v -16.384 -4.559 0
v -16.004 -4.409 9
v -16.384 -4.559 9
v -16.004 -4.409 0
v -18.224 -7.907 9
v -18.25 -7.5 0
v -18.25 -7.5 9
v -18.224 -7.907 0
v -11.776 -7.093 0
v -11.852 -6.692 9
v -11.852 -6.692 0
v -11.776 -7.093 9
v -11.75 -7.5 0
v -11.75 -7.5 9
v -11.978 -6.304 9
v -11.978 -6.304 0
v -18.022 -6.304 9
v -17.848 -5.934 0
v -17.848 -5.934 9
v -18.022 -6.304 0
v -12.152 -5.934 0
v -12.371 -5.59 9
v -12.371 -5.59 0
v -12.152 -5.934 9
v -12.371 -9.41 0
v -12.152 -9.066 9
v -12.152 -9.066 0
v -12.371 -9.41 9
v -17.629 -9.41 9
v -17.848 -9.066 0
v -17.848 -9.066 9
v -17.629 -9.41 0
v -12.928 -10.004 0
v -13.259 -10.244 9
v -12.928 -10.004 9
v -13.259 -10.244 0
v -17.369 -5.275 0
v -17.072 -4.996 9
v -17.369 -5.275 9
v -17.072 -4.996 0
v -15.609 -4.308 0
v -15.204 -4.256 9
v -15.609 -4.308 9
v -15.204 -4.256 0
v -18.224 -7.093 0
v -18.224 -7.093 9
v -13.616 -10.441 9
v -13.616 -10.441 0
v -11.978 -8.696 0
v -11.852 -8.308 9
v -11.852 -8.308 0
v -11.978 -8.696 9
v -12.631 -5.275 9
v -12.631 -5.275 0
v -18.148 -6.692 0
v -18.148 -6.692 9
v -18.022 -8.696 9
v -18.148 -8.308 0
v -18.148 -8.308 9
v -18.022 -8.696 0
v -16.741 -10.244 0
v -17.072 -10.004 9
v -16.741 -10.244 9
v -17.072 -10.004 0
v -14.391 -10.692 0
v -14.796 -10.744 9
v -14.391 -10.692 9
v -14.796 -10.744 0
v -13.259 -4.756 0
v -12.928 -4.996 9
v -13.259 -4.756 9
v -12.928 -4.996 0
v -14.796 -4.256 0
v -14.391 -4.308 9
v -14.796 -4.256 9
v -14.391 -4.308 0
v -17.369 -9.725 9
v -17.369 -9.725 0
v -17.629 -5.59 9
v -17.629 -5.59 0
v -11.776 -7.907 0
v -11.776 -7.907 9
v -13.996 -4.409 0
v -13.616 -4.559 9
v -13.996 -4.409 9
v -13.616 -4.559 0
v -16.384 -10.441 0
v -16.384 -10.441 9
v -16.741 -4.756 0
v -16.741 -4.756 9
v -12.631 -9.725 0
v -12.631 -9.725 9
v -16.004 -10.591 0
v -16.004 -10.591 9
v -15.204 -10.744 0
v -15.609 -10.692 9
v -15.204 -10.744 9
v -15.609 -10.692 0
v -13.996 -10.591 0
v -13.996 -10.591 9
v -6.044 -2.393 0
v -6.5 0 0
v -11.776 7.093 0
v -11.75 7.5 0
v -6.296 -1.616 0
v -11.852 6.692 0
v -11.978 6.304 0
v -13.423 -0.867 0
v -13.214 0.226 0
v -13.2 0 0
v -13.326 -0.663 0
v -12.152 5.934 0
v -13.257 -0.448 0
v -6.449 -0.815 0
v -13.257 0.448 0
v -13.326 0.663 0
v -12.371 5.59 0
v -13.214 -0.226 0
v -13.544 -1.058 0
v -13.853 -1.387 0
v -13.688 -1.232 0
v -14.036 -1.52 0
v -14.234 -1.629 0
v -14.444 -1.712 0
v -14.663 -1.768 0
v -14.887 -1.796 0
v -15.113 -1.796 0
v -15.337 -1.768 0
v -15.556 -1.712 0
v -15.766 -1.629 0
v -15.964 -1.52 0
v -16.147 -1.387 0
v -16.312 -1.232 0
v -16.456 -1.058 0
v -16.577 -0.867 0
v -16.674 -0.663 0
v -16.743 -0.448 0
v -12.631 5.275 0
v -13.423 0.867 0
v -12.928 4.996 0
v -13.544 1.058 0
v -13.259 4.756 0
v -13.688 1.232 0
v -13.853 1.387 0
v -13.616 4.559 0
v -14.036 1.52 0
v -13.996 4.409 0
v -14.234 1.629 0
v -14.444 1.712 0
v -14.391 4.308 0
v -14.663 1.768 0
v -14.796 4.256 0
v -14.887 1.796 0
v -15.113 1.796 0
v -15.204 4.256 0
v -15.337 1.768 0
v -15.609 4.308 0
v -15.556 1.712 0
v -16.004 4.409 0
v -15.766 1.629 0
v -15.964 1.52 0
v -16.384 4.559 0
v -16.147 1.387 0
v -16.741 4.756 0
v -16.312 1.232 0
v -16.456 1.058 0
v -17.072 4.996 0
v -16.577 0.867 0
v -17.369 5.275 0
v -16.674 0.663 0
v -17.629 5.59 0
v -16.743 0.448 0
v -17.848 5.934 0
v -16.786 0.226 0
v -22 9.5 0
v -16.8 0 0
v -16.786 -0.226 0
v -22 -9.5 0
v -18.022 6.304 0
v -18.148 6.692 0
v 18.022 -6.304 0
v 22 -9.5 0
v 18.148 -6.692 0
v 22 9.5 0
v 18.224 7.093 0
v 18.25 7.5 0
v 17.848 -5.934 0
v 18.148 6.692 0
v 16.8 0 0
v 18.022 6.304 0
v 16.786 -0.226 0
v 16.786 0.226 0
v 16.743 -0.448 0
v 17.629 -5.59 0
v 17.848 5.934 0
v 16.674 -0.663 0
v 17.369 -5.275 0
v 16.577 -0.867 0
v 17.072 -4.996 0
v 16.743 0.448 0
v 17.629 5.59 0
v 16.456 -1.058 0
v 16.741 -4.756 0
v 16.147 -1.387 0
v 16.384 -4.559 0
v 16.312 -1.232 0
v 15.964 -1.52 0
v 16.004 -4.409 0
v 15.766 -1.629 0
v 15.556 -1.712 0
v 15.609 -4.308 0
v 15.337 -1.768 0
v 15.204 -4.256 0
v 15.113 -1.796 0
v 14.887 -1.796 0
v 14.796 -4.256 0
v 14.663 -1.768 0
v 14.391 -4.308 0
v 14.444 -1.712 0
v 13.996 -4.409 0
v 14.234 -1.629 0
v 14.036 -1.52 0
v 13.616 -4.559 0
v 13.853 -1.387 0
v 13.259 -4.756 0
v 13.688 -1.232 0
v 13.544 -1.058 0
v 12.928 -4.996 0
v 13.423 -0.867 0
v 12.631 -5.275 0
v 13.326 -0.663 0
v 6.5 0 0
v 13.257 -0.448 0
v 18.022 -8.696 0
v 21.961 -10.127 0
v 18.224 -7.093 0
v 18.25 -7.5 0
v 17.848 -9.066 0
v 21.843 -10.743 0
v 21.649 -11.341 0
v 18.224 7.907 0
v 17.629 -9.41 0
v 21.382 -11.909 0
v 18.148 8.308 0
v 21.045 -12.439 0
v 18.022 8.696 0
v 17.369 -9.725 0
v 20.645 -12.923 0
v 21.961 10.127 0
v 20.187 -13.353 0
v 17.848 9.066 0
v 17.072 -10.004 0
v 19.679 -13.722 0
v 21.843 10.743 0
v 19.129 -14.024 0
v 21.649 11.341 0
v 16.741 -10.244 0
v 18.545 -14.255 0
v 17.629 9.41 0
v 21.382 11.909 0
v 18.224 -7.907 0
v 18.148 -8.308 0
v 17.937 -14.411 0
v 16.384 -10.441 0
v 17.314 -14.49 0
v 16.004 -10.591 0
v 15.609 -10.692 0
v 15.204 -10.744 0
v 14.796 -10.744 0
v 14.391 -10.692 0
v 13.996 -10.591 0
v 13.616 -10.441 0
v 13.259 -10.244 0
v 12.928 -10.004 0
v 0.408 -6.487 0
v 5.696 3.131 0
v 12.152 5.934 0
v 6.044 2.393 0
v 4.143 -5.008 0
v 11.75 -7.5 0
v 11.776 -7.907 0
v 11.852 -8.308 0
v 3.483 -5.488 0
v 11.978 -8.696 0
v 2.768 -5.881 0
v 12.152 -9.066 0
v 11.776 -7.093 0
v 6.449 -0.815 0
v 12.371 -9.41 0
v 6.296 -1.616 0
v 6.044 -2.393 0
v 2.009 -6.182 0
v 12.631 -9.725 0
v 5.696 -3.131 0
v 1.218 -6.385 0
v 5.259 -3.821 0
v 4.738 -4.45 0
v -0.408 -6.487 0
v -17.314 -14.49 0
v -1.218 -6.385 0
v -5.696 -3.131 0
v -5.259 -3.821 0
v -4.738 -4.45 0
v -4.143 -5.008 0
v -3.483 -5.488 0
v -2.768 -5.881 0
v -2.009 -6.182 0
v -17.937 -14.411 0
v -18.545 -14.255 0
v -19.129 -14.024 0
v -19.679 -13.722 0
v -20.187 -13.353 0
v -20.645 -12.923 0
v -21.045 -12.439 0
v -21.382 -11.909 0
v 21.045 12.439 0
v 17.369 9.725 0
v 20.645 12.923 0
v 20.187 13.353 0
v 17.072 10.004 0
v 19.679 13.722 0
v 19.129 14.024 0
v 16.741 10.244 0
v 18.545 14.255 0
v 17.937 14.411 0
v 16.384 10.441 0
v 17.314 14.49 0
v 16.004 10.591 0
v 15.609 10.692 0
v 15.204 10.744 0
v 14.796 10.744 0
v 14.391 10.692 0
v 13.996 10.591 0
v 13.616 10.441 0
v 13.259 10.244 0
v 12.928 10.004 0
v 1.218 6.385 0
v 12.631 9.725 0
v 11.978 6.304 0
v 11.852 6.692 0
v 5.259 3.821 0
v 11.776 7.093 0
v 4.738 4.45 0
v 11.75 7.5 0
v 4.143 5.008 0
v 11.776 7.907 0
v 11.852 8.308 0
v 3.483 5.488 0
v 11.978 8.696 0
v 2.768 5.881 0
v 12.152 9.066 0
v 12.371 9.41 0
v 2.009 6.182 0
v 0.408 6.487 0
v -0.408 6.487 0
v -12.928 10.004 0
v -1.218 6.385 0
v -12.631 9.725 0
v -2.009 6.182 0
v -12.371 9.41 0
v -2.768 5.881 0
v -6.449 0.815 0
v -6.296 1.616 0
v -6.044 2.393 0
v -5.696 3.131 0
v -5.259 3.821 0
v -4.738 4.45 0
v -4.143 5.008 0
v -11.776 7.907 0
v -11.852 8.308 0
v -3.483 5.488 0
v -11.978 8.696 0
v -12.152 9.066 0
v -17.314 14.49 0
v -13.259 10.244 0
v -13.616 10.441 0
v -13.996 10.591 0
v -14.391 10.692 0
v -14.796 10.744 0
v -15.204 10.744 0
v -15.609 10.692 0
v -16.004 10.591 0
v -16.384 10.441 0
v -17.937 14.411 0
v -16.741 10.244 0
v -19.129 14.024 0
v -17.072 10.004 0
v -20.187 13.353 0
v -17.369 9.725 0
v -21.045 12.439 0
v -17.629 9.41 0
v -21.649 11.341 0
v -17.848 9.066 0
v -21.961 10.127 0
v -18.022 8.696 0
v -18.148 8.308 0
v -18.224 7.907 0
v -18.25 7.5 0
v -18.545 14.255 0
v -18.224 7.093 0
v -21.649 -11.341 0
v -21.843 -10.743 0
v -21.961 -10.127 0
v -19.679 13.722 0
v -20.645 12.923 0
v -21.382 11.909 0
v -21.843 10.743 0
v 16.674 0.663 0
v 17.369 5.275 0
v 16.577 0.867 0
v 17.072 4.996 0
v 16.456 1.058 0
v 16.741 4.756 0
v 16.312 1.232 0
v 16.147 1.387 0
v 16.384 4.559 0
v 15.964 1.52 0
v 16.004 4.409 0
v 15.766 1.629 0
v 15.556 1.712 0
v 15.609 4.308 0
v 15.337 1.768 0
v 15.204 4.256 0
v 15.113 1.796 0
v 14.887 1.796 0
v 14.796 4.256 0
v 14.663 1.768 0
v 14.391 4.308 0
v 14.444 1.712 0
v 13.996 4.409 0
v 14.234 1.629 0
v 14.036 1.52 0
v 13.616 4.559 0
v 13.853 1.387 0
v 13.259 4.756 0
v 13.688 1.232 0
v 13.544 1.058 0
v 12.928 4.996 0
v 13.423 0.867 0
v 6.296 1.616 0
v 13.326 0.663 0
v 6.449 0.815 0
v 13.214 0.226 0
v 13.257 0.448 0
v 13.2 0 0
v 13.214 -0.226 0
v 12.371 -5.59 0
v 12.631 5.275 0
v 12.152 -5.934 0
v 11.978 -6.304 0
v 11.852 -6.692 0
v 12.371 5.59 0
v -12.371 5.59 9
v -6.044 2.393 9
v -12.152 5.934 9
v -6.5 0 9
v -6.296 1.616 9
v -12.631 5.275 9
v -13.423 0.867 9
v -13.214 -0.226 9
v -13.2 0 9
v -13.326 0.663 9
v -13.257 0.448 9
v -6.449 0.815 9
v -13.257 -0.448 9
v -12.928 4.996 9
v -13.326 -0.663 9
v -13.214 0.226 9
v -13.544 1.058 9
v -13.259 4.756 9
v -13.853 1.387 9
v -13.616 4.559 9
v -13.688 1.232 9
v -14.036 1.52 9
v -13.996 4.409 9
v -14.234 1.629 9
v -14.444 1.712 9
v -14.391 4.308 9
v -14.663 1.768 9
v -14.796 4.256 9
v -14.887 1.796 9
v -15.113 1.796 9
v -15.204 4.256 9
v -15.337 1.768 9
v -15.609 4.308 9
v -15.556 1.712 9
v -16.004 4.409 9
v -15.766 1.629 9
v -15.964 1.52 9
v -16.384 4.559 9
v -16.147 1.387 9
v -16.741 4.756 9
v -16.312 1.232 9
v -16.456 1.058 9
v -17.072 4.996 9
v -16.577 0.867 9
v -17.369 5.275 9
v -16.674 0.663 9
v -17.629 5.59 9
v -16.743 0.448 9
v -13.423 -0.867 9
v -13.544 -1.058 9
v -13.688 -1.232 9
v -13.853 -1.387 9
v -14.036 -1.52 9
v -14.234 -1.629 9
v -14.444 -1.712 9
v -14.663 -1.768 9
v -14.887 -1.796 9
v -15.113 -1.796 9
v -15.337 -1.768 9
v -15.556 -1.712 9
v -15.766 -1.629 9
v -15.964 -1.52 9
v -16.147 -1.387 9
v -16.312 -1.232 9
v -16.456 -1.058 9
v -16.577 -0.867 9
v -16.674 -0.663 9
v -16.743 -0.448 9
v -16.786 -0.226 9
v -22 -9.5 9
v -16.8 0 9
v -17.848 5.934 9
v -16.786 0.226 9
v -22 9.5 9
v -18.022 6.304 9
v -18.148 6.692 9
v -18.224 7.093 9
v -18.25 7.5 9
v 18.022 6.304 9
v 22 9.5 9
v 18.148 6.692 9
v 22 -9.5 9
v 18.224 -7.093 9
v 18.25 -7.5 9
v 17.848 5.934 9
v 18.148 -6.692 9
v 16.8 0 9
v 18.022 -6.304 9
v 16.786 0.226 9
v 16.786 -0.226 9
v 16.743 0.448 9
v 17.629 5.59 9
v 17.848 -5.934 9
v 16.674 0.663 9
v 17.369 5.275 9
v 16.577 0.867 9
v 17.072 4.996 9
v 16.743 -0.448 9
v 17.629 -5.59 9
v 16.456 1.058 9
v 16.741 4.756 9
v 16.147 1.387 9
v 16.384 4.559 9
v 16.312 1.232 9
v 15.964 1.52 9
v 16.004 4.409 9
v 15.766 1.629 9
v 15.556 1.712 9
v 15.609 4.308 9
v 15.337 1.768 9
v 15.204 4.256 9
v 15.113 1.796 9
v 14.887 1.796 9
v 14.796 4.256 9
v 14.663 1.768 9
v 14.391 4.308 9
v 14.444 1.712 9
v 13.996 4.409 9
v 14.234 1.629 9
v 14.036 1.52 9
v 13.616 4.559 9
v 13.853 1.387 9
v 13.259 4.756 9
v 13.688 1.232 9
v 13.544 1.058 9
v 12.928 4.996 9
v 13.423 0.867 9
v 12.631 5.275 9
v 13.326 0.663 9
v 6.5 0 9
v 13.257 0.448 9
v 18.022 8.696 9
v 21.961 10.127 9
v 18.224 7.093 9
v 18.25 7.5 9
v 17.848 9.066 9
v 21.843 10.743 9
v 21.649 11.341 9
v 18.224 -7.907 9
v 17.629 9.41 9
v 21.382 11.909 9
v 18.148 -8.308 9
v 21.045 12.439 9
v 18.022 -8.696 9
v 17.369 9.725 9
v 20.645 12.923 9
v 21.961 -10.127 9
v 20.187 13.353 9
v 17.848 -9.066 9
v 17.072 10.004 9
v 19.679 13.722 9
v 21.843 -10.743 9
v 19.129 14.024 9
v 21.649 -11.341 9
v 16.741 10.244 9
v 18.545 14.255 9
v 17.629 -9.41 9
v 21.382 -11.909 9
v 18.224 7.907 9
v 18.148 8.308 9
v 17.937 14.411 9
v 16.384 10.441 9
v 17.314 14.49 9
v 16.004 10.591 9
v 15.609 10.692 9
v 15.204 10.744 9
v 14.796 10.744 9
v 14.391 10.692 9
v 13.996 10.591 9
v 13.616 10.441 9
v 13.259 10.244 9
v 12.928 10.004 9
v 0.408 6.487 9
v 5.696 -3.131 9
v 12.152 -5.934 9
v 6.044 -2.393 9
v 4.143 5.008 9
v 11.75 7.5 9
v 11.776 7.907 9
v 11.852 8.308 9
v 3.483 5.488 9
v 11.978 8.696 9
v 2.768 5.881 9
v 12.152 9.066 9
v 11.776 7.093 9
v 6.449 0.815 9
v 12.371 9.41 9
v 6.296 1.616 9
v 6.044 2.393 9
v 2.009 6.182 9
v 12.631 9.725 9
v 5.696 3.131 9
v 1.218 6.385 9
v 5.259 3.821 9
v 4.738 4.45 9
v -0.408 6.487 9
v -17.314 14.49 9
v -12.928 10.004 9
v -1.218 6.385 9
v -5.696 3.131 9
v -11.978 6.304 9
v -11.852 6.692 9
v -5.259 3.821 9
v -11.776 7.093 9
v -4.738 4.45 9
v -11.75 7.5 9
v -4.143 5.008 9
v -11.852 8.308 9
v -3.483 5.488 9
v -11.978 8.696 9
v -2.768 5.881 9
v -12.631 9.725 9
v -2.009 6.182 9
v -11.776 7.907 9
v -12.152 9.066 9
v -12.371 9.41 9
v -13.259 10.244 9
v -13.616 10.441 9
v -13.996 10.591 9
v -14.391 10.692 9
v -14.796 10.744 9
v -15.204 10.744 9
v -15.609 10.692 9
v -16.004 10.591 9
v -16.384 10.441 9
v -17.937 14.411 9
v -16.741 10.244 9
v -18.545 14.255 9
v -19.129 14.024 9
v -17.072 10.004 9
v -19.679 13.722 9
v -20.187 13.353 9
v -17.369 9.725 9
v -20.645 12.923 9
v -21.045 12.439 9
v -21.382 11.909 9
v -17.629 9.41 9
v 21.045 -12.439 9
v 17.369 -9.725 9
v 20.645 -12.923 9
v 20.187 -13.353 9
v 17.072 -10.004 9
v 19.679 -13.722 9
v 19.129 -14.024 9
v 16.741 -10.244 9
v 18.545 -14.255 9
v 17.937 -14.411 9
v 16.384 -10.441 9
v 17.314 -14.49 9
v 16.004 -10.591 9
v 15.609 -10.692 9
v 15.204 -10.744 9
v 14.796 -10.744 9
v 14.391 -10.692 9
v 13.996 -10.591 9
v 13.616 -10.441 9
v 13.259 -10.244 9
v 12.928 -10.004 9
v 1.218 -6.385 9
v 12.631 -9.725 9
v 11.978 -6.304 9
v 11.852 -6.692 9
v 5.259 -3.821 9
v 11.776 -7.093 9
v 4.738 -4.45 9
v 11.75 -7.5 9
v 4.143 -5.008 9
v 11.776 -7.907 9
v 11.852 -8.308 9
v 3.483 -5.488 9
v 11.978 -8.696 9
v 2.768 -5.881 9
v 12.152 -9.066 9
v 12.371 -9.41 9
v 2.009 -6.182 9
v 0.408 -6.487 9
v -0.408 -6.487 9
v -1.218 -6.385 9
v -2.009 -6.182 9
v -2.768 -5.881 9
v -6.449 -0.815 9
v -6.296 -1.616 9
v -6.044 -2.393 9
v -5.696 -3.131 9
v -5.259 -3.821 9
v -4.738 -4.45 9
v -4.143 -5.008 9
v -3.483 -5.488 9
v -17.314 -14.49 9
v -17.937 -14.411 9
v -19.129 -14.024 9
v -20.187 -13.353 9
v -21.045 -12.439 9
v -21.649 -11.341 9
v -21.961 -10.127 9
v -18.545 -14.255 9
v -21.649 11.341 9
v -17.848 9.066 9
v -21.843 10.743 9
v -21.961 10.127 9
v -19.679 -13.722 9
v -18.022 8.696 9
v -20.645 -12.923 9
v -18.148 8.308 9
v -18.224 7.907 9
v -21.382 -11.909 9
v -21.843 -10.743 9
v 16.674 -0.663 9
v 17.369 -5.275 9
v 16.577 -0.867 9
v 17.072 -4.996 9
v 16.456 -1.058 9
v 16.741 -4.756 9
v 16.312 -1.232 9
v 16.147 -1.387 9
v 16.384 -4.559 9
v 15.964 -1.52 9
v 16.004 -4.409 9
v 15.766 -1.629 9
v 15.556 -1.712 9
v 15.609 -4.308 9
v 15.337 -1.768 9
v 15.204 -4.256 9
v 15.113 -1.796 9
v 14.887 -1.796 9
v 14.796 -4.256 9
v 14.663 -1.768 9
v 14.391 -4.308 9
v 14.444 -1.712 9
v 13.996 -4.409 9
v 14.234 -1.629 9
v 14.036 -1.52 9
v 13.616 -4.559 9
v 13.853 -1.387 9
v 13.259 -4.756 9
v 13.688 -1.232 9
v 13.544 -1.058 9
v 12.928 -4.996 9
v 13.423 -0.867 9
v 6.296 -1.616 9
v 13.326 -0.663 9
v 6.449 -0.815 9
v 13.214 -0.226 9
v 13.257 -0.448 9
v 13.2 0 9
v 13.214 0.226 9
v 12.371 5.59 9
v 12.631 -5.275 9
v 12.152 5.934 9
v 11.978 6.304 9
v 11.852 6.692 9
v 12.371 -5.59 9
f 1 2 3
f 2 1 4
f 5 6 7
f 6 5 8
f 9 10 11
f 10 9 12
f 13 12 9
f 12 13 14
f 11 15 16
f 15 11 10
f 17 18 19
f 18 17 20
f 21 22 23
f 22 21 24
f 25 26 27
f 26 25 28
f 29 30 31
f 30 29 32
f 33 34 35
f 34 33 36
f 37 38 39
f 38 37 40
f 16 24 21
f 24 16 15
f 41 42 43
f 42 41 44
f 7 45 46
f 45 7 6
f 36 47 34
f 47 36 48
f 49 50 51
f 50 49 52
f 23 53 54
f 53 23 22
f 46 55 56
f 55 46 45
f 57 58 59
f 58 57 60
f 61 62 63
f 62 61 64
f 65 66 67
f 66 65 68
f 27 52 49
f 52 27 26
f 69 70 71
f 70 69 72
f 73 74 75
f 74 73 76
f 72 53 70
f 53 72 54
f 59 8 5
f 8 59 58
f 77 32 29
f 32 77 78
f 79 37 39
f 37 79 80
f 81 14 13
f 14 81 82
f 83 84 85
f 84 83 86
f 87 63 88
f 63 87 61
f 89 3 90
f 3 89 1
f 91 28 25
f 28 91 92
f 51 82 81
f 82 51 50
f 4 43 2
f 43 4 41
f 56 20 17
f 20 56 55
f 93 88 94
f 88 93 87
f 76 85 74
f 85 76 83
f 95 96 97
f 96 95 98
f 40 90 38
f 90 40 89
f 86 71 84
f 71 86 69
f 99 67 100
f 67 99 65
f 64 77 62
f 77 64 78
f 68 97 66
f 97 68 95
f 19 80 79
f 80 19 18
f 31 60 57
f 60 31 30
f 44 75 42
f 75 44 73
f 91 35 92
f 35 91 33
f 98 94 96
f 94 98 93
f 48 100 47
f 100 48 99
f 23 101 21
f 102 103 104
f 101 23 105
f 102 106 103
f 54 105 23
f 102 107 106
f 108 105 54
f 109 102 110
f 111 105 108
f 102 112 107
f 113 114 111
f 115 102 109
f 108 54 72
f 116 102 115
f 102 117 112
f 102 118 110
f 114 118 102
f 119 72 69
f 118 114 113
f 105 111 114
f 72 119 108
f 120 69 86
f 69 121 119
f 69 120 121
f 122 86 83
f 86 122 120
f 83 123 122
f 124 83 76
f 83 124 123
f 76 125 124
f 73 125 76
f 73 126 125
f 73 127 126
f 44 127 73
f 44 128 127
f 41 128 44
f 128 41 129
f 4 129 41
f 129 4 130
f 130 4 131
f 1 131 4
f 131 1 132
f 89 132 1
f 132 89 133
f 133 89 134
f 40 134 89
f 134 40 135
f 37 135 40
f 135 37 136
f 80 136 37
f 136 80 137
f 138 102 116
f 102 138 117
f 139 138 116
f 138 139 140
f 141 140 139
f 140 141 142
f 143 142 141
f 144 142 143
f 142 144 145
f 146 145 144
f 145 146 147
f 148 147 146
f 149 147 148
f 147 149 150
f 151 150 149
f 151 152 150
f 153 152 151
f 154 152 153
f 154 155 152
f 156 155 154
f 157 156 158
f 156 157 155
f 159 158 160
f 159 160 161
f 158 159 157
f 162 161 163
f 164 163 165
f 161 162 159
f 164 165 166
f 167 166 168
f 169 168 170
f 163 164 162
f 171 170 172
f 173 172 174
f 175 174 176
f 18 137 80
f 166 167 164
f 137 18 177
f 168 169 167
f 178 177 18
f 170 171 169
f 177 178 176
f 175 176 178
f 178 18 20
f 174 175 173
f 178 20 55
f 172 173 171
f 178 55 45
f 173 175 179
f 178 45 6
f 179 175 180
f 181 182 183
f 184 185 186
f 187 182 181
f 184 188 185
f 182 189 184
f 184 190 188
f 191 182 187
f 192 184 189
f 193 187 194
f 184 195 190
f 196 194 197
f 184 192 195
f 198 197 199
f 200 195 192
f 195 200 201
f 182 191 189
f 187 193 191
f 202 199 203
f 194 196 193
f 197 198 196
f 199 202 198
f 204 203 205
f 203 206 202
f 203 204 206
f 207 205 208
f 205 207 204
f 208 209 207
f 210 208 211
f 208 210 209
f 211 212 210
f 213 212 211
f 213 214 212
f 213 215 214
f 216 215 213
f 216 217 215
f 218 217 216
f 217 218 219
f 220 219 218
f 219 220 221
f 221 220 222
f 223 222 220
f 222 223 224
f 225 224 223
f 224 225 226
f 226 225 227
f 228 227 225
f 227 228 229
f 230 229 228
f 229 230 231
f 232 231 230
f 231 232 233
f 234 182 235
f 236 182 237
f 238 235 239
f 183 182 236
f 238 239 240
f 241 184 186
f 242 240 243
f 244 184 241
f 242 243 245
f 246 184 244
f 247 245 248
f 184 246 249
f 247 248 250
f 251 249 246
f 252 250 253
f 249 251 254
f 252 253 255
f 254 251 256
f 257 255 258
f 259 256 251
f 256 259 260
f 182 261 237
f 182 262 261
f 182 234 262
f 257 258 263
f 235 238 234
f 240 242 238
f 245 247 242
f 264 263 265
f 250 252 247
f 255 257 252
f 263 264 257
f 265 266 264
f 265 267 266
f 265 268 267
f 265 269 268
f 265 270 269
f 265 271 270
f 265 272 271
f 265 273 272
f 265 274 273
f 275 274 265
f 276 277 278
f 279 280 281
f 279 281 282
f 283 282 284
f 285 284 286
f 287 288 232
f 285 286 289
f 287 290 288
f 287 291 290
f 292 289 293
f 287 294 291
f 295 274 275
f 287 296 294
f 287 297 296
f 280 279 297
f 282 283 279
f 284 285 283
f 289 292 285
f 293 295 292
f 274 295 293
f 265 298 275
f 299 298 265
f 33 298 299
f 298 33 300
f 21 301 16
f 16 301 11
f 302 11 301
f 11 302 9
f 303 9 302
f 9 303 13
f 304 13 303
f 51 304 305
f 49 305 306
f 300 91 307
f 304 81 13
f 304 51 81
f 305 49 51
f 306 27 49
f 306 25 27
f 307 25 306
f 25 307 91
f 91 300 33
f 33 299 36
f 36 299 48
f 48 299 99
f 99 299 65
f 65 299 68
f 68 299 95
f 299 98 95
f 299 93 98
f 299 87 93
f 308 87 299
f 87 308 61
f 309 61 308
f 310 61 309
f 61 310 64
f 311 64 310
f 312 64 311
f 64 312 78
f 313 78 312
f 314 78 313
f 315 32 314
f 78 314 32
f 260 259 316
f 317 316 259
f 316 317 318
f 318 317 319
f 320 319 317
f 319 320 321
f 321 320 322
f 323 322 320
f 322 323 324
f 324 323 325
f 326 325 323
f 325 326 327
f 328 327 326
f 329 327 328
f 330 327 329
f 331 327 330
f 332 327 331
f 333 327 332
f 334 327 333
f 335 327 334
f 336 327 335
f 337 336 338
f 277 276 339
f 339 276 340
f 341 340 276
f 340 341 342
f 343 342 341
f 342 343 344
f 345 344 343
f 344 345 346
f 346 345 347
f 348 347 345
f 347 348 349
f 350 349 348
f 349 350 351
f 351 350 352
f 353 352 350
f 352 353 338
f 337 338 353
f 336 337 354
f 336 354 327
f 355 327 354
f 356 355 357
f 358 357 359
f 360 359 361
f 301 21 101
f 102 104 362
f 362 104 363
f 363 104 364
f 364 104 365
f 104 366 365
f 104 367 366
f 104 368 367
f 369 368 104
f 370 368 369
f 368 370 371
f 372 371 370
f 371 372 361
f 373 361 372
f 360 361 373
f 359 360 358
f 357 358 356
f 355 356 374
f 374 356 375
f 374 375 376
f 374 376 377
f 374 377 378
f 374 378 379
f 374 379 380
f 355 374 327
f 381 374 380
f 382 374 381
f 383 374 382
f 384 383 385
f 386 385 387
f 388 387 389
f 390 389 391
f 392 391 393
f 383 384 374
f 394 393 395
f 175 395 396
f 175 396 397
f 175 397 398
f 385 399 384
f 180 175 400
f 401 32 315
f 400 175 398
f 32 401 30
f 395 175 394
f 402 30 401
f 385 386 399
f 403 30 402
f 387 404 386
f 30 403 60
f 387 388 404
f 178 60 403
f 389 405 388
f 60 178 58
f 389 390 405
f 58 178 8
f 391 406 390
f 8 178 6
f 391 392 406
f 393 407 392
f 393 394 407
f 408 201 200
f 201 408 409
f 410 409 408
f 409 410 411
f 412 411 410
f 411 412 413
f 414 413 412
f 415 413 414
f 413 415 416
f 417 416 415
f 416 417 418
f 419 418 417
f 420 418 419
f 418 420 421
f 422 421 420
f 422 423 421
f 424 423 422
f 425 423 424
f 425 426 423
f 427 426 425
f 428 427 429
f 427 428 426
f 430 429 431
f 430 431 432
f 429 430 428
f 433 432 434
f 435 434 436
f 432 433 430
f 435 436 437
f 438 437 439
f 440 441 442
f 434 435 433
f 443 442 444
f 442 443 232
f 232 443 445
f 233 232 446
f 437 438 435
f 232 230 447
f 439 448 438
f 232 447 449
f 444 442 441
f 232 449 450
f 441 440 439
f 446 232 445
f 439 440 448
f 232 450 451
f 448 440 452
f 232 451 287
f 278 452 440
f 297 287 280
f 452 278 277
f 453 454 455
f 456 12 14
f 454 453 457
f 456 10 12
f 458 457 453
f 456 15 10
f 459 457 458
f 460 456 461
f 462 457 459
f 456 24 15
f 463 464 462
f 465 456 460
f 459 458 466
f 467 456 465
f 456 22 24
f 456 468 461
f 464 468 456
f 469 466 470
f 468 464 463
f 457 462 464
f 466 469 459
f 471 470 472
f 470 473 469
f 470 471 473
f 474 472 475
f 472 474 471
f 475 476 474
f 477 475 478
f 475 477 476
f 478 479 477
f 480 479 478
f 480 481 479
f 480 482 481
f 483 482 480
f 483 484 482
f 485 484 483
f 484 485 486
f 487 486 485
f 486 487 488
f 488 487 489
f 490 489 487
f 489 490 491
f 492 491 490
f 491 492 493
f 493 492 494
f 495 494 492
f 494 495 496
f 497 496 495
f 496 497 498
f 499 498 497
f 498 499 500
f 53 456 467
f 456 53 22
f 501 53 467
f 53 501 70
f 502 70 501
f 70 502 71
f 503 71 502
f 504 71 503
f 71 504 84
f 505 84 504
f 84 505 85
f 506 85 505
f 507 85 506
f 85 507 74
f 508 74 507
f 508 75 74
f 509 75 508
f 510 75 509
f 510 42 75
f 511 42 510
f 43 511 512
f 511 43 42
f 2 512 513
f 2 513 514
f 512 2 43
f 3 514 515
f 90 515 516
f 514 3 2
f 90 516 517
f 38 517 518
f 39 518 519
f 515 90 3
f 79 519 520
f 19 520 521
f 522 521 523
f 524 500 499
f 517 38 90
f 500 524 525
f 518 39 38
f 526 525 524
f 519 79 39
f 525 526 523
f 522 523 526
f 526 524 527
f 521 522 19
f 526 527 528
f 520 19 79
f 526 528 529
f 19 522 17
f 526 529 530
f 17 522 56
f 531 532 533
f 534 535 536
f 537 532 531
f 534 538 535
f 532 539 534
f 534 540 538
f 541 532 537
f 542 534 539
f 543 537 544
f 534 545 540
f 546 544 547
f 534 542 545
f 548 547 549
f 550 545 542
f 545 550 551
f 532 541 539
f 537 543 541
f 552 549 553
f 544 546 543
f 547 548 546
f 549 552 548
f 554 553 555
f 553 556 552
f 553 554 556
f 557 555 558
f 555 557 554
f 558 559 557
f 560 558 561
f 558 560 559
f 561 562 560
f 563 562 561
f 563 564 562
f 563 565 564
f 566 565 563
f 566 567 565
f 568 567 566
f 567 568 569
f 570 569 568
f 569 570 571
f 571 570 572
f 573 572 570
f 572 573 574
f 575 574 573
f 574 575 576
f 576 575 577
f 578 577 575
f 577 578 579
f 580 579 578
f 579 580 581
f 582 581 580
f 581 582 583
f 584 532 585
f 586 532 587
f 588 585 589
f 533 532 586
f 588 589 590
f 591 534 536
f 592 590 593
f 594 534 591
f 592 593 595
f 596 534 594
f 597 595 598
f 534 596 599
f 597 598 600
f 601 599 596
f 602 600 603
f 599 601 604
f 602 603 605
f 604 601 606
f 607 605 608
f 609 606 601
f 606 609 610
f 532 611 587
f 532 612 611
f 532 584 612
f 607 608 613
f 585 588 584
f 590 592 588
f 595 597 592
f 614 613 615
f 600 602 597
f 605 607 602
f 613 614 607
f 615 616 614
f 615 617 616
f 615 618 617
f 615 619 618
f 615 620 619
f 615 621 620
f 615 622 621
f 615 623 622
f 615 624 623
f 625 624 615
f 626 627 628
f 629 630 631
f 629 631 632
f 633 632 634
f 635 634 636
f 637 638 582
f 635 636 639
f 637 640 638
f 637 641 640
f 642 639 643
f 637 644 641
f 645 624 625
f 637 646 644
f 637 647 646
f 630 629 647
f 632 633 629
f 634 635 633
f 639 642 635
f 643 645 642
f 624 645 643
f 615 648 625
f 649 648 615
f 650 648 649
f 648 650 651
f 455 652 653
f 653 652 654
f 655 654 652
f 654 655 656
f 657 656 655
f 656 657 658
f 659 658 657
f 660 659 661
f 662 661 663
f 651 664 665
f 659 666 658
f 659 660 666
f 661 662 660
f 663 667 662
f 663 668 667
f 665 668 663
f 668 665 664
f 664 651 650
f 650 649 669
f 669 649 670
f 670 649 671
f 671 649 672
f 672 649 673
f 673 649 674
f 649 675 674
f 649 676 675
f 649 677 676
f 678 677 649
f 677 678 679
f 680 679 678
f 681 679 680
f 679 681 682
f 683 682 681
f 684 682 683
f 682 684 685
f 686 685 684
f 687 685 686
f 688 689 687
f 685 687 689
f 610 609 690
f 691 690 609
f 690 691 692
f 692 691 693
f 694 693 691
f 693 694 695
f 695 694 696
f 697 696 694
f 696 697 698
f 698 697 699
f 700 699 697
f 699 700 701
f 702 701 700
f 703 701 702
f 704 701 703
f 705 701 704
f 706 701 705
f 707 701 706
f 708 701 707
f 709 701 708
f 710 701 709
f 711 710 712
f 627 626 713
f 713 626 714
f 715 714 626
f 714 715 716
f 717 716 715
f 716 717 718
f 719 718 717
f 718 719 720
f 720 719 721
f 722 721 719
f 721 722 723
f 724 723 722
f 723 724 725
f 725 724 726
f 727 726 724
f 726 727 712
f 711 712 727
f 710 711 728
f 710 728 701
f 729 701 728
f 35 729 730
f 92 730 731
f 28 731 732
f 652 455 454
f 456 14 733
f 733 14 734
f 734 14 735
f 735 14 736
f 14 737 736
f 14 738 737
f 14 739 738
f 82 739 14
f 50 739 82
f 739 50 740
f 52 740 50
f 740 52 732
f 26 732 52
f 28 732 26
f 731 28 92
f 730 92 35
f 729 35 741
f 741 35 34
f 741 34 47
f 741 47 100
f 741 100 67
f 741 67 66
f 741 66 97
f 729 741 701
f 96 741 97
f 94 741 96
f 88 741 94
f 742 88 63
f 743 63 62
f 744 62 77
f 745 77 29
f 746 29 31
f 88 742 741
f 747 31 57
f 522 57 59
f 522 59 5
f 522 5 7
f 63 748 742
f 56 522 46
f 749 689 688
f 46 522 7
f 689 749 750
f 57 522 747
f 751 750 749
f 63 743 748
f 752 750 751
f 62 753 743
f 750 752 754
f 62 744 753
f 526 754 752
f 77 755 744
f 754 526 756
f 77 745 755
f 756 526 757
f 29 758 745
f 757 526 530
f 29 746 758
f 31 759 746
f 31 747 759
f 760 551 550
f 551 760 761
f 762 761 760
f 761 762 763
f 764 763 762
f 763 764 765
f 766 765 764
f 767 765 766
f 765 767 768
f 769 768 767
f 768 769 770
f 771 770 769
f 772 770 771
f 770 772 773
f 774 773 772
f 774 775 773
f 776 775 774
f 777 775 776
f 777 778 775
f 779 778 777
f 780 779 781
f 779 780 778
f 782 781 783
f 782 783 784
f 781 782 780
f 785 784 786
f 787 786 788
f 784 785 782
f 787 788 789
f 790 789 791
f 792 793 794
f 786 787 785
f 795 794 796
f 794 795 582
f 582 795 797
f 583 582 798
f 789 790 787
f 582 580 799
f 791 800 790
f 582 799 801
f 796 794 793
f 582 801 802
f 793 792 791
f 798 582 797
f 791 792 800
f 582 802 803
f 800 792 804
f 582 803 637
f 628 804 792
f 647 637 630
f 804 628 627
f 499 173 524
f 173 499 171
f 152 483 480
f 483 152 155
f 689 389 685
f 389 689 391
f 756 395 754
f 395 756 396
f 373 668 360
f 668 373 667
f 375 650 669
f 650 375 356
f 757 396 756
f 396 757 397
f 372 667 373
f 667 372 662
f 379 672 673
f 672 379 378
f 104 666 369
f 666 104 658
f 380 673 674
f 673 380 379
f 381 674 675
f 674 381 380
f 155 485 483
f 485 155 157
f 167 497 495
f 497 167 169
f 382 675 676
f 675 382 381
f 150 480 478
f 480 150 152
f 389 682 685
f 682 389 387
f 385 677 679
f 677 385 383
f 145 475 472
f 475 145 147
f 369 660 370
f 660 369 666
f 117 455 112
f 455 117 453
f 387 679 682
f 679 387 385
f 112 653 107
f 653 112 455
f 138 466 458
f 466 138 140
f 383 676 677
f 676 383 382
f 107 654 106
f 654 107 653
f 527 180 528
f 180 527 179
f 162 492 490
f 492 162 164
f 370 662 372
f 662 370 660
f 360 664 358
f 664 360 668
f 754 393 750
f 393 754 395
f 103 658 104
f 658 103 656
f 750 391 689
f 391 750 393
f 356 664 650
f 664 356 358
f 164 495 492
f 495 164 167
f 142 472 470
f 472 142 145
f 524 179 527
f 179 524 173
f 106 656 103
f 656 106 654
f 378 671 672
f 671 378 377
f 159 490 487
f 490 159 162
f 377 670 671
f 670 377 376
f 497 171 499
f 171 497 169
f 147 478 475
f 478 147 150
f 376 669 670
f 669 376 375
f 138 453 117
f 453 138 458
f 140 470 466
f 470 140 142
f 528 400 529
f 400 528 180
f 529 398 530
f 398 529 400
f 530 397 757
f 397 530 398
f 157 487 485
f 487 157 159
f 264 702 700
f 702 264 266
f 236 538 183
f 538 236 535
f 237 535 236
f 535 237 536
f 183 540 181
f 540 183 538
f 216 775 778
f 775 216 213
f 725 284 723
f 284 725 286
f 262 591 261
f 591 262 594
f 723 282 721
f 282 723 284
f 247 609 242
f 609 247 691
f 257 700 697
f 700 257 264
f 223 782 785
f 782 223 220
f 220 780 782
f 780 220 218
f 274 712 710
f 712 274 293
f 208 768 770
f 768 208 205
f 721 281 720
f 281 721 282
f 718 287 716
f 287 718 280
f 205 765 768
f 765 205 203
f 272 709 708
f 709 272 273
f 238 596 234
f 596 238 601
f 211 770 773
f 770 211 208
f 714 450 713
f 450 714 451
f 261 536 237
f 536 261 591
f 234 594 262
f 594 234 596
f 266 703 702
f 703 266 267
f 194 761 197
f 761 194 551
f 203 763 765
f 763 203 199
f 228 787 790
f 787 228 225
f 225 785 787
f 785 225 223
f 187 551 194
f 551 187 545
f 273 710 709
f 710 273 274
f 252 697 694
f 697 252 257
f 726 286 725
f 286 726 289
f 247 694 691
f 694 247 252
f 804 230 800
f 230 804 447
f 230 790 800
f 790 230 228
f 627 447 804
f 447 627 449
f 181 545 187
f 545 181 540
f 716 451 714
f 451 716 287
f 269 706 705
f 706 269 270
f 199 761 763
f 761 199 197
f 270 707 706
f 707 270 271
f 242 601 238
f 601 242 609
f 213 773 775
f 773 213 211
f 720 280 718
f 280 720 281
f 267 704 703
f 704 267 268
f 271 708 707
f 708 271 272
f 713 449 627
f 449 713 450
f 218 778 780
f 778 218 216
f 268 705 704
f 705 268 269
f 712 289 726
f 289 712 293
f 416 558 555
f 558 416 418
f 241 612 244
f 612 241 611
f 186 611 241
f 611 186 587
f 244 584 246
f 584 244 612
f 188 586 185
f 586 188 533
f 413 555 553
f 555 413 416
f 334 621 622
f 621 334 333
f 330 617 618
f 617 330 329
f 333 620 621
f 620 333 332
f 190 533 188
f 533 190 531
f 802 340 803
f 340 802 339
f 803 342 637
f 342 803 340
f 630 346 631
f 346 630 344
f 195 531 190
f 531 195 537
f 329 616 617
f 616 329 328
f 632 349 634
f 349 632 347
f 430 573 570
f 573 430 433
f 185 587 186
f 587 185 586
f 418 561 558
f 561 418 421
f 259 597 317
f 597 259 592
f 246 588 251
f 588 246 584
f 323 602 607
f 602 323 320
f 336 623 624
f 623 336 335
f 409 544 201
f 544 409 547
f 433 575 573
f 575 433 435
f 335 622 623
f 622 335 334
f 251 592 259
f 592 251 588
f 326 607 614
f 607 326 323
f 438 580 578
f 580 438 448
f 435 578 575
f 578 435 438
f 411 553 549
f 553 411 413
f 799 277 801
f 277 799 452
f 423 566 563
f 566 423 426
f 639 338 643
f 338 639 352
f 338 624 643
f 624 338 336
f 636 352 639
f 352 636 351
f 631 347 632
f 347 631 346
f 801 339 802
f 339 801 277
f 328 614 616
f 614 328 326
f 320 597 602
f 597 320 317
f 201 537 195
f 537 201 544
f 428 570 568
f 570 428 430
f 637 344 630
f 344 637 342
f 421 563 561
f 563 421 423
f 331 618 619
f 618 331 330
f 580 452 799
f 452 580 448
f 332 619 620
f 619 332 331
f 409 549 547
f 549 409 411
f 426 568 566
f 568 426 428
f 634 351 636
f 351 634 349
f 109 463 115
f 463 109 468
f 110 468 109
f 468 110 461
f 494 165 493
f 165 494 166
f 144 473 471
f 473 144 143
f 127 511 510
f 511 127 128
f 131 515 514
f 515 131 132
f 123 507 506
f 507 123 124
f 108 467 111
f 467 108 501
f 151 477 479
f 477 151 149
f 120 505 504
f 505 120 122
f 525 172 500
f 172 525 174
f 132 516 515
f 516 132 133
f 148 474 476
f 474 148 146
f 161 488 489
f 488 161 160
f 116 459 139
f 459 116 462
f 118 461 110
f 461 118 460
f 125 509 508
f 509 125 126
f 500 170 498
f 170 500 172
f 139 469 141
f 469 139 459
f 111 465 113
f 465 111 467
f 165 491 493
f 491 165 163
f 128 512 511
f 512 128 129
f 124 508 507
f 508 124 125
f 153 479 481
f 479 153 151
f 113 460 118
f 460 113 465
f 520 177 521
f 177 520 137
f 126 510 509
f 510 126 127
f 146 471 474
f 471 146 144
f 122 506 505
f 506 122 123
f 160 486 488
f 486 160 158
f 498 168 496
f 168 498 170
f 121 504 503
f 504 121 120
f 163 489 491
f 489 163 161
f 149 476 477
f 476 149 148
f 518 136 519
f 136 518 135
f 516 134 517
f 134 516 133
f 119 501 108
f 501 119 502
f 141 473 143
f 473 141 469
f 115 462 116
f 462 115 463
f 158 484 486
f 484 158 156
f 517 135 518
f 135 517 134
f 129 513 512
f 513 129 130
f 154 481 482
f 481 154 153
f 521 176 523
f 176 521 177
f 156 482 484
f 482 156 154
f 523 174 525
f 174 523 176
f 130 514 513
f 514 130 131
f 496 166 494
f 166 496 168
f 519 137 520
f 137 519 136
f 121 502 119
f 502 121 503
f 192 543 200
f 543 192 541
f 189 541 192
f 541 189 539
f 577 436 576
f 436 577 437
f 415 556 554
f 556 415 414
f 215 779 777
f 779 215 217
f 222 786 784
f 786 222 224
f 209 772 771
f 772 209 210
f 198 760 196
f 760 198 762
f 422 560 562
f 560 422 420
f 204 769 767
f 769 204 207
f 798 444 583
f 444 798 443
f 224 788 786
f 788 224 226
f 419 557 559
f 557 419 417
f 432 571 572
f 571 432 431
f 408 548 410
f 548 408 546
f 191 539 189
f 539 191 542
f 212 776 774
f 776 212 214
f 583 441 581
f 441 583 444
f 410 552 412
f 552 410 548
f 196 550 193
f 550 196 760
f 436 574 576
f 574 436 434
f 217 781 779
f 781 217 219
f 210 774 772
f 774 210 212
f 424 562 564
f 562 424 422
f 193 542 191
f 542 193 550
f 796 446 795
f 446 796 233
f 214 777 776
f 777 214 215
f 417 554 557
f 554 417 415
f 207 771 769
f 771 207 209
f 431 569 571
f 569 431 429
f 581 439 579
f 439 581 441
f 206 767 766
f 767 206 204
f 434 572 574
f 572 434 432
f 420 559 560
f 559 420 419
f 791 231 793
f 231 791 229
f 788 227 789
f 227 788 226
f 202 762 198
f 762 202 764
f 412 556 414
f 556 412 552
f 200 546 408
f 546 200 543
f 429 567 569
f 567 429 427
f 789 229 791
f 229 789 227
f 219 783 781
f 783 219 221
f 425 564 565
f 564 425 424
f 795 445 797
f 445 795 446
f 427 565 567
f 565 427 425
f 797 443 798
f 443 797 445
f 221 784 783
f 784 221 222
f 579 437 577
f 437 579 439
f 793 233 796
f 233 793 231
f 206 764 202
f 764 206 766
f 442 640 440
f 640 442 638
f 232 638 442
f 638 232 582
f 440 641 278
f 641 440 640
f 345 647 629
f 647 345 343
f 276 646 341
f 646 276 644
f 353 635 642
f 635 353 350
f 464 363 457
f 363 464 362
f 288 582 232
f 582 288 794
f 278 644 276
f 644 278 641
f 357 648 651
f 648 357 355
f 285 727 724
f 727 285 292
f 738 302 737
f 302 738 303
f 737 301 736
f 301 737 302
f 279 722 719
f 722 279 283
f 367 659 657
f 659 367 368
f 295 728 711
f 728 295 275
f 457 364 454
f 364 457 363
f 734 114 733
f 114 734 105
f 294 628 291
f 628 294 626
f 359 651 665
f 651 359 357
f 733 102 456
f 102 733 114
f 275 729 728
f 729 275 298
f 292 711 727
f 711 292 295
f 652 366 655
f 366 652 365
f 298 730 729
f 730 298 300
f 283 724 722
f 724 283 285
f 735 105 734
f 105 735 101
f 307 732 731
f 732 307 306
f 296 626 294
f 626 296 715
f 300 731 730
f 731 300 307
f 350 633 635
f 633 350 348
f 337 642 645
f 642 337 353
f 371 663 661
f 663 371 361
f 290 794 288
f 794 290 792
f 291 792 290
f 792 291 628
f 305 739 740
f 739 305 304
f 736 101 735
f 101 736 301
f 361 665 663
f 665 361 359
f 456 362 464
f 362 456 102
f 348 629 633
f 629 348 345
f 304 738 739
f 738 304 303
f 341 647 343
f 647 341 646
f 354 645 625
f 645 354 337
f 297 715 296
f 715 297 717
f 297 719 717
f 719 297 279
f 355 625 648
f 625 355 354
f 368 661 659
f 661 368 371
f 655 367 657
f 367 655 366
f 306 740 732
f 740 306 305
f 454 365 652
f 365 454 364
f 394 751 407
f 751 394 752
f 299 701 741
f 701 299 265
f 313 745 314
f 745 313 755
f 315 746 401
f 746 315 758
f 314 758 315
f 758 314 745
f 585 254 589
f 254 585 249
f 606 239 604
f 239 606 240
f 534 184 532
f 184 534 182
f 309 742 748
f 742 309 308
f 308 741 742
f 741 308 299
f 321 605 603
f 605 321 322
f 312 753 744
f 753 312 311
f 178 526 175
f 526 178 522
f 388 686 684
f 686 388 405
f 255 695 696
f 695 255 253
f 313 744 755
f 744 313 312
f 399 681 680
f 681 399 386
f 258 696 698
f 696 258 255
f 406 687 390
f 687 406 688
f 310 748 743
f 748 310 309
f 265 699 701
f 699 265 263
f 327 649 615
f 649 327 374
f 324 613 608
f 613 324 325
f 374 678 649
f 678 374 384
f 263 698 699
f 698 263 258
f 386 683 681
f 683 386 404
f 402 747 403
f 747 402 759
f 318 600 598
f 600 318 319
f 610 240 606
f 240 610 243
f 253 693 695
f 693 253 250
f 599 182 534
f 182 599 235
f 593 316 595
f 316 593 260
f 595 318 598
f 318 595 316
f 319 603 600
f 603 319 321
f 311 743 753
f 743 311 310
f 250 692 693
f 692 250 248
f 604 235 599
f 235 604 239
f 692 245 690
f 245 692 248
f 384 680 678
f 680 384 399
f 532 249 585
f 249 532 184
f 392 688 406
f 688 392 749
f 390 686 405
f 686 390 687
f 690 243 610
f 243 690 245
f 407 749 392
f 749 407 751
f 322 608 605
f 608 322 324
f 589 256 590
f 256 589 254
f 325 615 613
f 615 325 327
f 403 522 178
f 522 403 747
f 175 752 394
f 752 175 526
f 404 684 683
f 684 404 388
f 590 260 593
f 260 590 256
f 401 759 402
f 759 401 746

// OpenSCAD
$fn = 50;

difference() {
	union() {
		hull() {
			translate(v = [-17.0, 9.5, 0]) {
				cylinder(h = 9, r = 5);
			}
			translate(v = [17.0, 9.5, 0]) {
				cylinder(h = 9, r = 5);
			}
			translate(v = [-17.0, -9.5, 0]) {
				cylinder(h = 9, r = 5);
			}
			translate(v = [17.0, -9.5, 0]) {
				cylinder(h = 9, r = 5);
			}
		}
	}
	union() {
		translate(v = [-15.0, -7.5, 0]) {
			cylinder(h = 9, r = 3.25);
		}
		translate(v = [-15.0, 7.5, 0]) {
			cylinder(h = 9, r = 3.25);
		}
		translate(v = [15.0, -7.5, 0]) {
			cylinder(h = 9, r = 3.25);
		}
		translate(v = [15.0, 7.5, 0]) {
			cylinder(h = 9, r = 3.25);
		}
		translate(v = [-15.0, 0.0, 0]) {
			cylinder(h = 9, r = 1.8);
		}
		translate(v = [15.0, 0.0, 0]) {
			cylinder(h = 9, r = 1.8);
		}
		cylinder(h = 9, r = 6.5);
	}
}
